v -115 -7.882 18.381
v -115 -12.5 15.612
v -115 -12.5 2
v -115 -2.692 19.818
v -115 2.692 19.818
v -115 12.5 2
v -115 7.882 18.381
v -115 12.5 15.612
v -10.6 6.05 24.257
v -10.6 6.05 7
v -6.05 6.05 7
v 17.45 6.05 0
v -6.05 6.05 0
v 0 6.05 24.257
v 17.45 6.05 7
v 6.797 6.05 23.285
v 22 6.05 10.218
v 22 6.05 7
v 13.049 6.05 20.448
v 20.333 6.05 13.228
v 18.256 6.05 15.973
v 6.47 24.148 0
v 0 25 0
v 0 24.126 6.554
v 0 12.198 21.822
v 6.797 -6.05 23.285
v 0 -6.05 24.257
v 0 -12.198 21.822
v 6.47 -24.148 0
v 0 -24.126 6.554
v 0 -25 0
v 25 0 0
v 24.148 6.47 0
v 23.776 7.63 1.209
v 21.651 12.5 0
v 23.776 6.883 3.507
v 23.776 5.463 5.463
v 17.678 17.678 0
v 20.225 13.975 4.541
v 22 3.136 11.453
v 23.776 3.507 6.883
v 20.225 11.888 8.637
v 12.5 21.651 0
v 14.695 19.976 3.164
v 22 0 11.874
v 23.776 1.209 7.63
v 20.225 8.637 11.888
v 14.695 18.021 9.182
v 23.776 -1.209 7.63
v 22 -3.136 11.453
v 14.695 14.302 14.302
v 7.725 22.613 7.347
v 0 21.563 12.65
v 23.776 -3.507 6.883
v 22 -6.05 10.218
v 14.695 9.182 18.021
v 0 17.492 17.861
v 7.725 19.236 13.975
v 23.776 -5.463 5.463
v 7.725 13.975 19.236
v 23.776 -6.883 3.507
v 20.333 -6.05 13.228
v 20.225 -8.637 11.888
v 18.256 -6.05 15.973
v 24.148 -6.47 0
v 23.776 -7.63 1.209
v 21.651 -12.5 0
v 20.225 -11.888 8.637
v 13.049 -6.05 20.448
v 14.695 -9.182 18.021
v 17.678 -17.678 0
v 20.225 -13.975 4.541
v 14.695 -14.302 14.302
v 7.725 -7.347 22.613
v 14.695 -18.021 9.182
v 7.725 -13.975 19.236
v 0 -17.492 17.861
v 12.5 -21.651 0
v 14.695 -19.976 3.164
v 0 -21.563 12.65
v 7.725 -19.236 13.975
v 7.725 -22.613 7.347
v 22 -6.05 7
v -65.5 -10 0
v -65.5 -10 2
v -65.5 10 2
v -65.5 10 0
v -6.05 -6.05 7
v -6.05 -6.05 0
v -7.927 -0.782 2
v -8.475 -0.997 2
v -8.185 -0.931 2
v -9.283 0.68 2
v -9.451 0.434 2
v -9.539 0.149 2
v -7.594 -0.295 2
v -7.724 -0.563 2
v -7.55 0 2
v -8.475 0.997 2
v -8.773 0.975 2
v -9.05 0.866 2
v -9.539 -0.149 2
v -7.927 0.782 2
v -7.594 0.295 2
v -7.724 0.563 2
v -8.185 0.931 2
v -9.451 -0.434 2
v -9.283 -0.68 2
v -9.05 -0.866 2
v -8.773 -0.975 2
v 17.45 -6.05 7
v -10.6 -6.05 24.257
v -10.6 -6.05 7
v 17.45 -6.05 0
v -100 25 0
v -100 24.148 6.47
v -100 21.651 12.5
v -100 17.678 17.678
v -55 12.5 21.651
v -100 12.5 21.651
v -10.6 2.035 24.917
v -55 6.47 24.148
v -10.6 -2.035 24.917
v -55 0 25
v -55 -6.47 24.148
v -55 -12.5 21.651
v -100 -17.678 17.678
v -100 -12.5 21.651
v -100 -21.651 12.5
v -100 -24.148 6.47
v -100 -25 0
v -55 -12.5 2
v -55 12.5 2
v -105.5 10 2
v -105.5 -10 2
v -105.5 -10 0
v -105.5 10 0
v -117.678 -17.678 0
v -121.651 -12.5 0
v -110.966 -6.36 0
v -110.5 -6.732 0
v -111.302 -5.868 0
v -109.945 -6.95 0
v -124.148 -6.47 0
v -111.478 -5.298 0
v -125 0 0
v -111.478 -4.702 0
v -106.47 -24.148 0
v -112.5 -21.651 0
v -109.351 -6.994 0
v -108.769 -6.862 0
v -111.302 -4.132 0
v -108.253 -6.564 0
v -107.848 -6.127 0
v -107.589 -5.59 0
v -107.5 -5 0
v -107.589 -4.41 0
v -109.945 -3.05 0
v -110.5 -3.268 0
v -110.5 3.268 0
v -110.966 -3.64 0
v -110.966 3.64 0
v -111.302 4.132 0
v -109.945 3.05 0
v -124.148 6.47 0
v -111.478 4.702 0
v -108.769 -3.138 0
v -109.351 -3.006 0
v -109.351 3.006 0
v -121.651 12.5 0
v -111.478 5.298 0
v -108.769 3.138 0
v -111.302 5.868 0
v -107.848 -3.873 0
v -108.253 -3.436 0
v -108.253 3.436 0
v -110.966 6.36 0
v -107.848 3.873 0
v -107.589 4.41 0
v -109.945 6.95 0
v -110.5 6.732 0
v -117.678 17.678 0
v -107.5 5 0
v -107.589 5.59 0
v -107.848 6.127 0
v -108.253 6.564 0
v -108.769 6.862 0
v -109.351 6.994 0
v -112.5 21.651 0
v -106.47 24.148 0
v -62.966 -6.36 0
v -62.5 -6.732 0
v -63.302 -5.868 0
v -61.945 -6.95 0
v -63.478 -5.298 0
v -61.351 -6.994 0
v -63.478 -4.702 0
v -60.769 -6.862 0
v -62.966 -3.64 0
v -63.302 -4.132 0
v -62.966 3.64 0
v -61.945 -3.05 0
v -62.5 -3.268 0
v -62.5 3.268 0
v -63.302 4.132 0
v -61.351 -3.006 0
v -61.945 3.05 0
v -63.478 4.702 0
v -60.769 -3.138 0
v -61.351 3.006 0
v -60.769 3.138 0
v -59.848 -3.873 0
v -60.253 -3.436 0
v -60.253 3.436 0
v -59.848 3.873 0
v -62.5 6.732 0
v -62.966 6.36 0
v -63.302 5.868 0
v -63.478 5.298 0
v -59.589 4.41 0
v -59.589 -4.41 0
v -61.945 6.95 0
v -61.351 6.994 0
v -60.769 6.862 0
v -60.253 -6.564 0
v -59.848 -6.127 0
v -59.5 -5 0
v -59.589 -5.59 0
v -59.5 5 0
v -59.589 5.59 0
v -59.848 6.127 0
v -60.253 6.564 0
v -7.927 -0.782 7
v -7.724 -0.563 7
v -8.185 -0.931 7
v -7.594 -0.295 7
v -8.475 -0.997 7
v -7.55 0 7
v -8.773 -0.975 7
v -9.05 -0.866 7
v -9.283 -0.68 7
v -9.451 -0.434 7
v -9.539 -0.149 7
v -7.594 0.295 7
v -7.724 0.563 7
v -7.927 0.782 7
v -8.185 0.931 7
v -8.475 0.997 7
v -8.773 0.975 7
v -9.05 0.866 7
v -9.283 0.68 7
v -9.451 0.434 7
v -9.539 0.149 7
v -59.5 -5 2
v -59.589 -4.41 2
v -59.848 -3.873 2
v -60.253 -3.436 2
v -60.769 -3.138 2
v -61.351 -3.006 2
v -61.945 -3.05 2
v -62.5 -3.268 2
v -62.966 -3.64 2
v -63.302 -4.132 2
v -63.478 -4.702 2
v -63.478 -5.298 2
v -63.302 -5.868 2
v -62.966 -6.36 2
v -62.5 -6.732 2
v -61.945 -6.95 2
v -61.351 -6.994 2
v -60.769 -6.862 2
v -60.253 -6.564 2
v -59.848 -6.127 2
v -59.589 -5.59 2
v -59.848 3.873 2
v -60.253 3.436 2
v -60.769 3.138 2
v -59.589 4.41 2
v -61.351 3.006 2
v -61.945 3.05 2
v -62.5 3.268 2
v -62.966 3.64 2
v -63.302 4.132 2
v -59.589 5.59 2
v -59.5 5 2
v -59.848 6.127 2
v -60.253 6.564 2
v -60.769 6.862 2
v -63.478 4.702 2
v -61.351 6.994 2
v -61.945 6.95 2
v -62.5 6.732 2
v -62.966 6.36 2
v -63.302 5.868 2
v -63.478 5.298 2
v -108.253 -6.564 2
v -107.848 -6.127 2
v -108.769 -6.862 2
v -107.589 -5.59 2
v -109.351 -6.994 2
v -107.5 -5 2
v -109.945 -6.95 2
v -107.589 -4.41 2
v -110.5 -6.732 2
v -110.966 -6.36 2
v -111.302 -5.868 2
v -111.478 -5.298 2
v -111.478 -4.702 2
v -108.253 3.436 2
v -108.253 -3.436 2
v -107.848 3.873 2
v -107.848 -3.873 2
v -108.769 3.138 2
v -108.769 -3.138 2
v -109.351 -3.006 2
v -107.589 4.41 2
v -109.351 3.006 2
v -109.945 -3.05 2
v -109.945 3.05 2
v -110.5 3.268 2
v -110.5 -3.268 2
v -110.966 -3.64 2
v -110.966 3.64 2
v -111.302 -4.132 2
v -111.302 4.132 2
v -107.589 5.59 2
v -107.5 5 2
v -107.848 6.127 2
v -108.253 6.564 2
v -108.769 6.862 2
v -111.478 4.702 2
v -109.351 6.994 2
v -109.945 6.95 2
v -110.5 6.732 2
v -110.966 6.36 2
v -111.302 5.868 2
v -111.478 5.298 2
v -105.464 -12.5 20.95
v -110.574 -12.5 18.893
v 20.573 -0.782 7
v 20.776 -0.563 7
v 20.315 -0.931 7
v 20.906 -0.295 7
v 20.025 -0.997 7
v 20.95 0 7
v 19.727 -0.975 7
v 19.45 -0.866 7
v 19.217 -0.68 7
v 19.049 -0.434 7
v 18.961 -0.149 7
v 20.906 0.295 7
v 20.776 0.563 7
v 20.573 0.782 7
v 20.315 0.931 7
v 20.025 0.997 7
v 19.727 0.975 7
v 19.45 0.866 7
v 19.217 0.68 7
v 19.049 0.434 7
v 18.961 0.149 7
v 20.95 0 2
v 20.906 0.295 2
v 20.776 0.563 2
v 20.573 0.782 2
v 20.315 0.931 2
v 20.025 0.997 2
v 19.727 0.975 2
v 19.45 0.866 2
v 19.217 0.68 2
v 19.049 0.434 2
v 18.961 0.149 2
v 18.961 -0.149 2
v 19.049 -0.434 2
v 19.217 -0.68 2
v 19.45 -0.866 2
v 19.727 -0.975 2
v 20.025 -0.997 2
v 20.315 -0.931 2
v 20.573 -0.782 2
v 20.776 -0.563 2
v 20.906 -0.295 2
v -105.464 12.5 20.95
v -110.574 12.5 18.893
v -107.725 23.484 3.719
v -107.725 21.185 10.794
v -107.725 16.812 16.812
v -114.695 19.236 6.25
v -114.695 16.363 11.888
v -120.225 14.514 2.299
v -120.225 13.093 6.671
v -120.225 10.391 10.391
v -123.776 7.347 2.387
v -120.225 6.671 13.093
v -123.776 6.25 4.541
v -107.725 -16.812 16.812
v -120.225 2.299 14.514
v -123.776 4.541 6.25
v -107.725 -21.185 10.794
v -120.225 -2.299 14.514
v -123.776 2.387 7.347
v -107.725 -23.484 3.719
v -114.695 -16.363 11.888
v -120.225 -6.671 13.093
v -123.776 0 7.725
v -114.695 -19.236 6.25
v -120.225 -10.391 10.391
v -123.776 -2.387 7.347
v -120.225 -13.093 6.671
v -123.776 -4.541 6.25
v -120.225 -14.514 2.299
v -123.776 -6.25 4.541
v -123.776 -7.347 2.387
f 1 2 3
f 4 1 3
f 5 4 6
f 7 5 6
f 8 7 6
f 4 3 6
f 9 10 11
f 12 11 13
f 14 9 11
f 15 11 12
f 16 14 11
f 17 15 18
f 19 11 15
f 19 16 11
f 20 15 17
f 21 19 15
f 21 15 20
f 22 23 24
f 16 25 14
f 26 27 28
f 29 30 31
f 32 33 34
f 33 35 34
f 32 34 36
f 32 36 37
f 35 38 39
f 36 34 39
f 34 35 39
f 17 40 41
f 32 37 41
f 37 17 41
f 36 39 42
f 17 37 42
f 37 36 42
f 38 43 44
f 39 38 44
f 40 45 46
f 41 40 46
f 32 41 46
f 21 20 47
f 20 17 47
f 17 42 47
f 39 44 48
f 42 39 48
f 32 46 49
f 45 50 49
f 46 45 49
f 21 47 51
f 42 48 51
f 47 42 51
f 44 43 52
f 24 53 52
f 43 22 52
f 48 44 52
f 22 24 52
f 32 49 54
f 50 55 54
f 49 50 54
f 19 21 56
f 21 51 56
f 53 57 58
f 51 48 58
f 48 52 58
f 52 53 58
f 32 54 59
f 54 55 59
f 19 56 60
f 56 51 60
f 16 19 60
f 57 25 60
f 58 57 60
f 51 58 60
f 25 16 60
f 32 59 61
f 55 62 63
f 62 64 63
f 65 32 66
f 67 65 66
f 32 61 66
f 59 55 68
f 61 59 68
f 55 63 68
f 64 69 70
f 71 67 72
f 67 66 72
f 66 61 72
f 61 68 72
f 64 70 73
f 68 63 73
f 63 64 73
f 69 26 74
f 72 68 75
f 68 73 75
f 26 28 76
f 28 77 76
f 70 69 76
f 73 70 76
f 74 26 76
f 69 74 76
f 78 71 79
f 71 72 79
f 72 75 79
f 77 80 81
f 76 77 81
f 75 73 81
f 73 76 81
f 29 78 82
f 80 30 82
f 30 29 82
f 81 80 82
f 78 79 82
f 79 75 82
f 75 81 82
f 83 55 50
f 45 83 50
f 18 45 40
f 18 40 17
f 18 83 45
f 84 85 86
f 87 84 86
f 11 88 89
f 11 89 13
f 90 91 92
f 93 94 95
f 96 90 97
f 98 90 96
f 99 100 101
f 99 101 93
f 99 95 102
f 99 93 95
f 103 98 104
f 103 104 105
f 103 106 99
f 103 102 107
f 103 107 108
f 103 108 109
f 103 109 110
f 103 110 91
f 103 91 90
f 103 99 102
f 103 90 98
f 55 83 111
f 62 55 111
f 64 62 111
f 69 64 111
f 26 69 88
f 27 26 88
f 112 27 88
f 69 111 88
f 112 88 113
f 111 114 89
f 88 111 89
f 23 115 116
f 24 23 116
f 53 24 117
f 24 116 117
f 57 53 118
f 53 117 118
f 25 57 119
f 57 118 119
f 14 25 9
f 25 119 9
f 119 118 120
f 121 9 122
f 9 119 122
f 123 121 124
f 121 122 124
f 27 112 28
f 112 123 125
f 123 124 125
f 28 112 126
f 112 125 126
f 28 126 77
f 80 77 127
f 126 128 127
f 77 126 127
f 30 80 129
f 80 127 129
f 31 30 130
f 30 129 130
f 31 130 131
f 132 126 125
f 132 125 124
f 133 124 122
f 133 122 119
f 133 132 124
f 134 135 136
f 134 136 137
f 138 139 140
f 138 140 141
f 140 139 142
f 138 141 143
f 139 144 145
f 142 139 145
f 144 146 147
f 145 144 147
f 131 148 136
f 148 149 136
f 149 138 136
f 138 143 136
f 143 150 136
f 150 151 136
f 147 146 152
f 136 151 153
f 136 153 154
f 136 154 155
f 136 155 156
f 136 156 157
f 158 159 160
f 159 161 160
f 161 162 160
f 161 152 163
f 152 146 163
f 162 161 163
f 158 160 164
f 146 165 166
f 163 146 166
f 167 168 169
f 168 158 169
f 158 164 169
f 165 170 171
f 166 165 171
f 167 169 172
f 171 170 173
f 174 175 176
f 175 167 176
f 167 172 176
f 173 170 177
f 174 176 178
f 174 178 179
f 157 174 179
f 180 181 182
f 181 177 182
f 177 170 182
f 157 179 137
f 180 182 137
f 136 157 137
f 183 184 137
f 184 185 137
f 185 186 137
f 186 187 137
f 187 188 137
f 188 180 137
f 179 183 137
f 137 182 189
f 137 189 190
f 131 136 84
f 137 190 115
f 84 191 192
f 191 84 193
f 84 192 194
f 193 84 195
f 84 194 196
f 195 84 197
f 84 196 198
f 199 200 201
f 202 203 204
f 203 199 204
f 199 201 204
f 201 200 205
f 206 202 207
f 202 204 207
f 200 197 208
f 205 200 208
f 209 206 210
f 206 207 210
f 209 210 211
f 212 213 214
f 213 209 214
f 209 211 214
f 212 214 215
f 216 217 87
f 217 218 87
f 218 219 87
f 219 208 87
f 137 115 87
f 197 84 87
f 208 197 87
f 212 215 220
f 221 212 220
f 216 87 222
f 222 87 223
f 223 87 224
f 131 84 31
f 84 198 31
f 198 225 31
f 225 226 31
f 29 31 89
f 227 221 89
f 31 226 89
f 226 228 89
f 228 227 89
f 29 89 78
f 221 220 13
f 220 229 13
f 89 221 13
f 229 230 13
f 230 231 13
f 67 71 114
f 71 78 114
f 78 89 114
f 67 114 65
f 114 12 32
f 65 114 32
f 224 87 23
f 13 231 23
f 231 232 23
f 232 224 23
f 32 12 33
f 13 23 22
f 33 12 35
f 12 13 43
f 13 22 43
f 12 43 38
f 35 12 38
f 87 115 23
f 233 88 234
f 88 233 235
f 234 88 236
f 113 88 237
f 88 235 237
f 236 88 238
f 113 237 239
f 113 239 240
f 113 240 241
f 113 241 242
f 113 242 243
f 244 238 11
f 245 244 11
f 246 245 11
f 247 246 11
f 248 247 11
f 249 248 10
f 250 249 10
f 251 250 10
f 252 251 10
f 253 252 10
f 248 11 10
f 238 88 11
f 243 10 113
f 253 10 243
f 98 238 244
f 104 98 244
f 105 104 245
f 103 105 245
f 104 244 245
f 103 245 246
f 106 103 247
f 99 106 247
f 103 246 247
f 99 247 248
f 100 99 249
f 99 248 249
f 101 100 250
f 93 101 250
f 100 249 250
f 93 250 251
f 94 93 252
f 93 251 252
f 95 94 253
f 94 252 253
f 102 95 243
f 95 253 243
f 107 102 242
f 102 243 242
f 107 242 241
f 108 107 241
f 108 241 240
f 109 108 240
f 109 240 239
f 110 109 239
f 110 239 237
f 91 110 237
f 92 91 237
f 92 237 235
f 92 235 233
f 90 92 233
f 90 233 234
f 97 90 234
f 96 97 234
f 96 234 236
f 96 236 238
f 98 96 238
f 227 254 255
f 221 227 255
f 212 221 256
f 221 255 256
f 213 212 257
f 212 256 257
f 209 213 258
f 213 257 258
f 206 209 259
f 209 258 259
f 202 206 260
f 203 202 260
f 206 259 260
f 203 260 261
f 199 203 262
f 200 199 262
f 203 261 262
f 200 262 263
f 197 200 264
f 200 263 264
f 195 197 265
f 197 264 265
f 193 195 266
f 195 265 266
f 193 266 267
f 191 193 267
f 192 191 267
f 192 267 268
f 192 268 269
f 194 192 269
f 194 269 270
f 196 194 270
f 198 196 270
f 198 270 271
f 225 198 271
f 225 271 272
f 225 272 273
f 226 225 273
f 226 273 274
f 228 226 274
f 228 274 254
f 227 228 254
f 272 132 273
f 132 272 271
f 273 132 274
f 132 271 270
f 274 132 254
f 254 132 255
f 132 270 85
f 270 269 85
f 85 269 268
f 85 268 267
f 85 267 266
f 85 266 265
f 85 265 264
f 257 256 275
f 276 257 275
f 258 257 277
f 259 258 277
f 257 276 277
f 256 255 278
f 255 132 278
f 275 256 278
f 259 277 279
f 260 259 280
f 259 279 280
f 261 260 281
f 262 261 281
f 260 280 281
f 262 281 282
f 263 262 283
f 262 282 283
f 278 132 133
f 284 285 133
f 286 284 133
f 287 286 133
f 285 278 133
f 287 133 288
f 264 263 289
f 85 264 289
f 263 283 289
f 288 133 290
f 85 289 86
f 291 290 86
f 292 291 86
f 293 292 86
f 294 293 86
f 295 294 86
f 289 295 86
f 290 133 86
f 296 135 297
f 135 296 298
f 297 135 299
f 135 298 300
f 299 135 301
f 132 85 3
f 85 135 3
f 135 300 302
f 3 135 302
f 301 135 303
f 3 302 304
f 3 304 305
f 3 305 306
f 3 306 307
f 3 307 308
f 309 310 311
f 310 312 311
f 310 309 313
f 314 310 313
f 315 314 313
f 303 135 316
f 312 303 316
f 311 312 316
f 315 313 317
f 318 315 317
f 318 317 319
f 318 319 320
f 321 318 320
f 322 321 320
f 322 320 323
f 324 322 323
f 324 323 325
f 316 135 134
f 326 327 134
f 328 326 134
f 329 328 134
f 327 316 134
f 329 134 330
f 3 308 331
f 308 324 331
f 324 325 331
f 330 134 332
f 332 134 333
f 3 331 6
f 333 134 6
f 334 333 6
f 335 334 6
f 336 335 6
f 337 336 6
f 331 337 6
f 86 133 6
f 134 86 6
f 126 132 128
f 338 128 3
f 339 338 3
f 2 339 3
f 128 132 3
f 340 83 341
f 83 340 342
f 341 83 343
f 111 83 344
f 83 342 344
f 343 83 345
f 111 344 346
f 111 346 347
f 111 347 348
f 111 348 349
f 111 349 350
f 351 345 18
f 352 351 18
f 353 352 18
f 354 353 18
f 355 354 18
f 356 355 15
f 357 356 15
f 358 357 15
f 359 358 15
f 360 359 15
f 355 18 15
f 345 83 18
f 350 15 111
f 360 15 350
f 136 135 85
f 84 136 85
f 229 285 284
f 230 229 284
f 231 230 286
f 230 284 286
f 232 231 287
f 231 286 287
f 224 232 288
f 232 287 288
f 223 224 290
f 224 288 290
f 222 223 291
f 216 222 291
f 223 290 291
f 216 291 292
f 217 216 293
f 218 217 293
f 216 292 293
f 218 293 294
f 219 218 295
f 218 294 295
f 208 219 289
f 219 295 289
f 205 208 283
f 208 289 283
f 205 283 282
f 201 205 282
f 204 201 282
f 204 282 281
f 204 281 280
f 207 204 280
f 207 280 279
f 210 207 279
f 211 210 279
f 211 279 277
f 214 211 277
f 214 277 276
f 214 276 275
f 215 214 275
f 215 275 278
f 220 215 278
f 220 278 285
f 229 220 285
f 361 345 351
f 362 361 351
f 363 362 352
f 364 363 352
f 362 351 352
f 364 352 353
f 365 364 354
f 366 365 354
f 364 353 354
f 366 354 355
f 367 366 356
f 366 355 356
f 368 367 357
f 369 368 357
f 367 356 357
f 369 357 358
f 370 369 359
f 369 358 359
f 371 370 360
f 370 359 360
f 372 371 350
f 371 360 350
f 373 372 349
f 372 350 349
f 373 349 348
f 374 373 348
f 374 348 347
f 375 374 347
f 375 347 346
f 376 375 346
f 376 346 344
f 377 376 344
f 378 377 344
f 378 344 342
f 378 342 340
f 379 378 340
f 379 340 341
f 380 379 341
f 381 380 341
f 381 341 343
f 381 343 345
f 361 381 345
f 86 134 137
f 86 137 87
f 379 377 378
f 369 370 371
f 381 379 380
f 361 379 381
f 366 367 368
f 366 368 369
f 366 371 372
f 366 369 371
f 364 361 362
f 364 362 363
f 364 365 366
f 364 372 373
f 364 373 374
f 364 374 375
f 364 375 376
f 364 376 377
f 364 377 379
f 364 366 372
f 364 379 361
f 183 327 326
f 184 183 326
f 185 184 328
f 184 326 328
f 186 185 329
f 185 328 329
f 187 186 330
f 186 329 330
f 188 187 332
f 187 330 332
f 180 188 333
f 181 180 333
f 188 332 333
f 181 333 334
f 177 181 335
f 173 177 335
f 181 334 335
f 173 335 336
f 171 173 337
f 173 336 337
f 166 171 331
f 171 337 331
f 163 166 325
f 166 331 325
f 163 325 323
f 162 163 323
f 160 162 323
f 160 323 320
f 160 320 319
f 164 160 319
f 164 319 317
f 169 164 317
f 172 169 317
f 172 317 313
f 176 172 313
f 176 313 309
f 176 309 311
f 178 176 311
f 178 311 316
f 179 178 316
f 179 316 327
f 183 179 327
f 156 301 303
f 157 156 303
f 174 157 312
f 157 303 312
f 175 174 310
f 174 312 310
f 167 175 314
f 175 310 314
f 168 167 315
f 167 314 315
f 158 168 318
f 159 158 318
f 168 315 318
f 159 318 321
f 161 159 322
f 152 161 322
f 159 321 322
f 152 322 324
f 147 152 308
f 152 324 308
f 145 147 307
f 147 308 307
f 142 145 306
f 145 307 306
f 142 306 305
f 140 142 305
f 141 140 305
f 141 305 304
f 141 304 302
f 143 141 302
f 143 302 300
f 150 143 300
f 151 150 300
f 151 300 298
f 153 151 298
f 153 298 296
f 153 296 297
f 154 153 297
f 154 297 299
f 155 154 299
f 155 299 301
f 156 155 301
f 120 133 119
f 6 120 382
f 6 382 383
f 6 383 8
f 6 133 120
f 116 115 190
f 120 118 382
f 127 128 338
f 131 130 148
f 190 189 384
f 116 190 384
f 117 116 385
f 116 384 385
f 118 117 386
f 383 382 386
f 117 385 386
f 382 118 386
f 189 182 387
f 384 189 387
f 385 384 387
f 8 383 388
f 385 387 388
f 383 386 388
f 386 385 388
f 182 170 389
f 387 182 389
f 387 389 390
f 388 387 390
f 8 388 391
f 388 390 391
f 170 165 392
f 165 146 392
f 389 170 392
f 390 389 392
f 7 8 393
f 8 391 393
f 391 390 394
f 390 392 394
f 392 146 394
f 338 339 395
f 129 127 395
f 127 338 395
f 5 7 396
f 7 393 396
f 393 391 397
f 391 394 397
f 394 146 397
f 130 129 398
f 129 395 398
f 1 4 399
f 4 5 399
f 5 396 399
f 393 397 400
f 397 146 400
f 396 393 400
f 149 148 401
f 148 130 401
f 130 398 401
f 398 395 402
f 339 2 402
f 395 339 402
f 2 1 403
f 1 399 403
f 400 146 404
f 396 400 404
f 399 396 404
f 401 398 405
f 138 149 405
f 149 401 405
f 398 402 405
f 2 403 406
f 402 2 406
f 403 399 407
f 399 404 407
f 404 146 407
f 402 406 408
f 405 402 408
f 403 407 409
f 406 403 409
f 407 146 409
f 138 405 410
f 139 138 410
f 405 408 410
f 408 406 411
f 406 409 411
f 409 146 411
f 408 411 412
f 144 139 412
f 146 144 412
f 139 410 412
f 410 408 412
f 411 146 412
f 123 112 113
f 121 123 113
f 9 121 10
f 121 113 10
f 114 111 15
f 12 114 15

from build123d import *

# Parameters (mm, degrees)
REVOLVE1_ANGLE                  = 180
CUT_EXTRUDE3_START              = -2
SKETCH3_W                       = 60
SKETCH3_H                       = 25
CUT_EXTRUDE3_DEPTH              = 24
SKETCH7_R                       = 2
SKETCH7_W                       = 40
SKETCH7_H                       = 20
SKETCH7_R_2                     = 3
CUT_EXTRUDE8_DEPTH              = 10
CUT_EXTRUDE13_START             = 25
SKETCH16_R                      = 1
SKETCH16_W                      = 23.5
SKETCH16_H                      = 12.1
CUT_EXTRUDE13_DEPTH             = 23
CUT_EXTRUDE14_START             = -7
SKETCH18_W                      = 4.55
SKETCH18_H                      = 12.1
CUT_EXTRUDE14_DEPTH             = 19.0000001
SKETCH19_R                      = 2.5
CUT_EXTRUDE15_DEPTH             = 3
SKIZZE1_R                       = 4.489769008
SCHNITT_LINEAR_AUSTRAGEN1_DEPTH = 10
SKIZZE2_W                       = 23.5
SKIZZE2_H                       = 12.1
SCHNITT_LINEAR_AUSTRAGEN2_DEPTH = 10


with BuildPart() as part:
    # Sketch1 → Revolve1 (revolve)
    with BuildSketch(Plane.XY):
        with BuildLine():
            Line((-125, 0), (25, 0))
            ThreePointArc((25, 0), (17.67766953, 17.67766953), (0, 25))
            Line((0, 25), (-100, 25))
            ThreePointArc((-100, 25), (-117.67766953, 17.67766953), (-125, 0))
        make_face()
    revolve(axis=Axis((-125, 0, 0), (1, 0, 0)), revolution_arc=REVOLVE1_ANGLE)

    # Sketch3 → Cut-Extrude3 (cut, through all)
    with BuildSketch(Plane(origin=(0, 0, 0), x_dir=(-1, 0, 0), z_dir=(0, 0, -1)).offset(CUT_EXTRUDE3_START)):
        with Locations((85, 0)):
            Rectangle(SKETCH3_W, SKETCH3_H)
    extrude(amount=-CUT_EXTRUDE3_DEPTH, mode=Mode.SUBTRACT)

    # Sketch7 → Cut-Extrude8 (cut)
    with BuildSketch(Plane.XY.offset(2)):
        with Locations((-109.5, 5)):
            Circle(SKETCH7_R)
        with Locations((-61.5, 5)):
            Circle(SKETCH7_R)
        with Locations((-109.5, -5)):
            Circle(SKETCH7_R)
        with Locations((-61.5, -5)):
            Circle(SKETCH7_R)
        with Locations((-85.5, 0)):
            Rectangle(SKETCH7_W, SKETCH7_H)
        with Locations((-95.5, -0.25)):
            Circle(SKETCH7_R_2, mode=Mode.SUBTRACT)
    extrude(amount=-CUT_EXTRUDE8_DEPTH, mode=Mode.SUBTRACT)

    # Sketch16 → Cut-Extrude13 (cut)
    with BuildSketch(Plane.XY.offset(CUT_EXTRUDE13_START)):
        with Locations((-8.55, 0)):
            Circle(SKETCH16_R)
        with Locations((19.95, 0)):
            Circle(SKETCH16_R)
        with Locations((5.7, 0)):
            Rectangle(SKETCH16_W, SKETCH16_H)
    extrude(amount=-CUT_EXTRUDE13_DEPTH, mode=Mode.SUBTRACT)

    # Sketch18 → Cut-Extrude14 (cut, through all)
    with BuildSketch(Plane(origin=(0, 0, 0), x_dir=(-1, 0, 0), z_dir=(0, 0, -1)).offset(CUT_EXTRUDE14_START)):
        with Locations((-19.725, 0)):
            Rectangle(SKETCH18_W, SKETCH18_H)
        with Locations((8.325, 0)):
            Rectangle(SKETCH18_W, SKETCH18_H)
    extrude(amount=-CUT_EXTRUDE14_DEPTH, mode=Mode.SUBTRACT)

    # Sketch19 → Cut-Extrude15 (cut, through all)
    with BuildSketch(Plane.XY.offset(2)):
        with Locations((11, 0)):
            Circle(SKETCH19_R)
    extrude(amount=-CUT_EXTRUDE15_DEPTH, mode=Mode.SUBTRACT)

    # Skizze1 → Schnitt-Linear austragen1 (cut)
    with BuildSketch(Plane.XY.offset(2)):
        with Locations((-95.5, -0.25)):
            Circle(SKIZZE1_R)
    extrude(amount=-SCHNITT_LINEAR_AUSTRAGEN1_DEPTH, mode=Mode.SUBTRACT)

    # Skizze2 → Schnitt-Linear austragen2 (cut)
    with BuildSketch(Plane.XY.offset(2)):
        with Locations((5.7, 0)):
            Rectangle(SKIZZE2_W, SKIZZE2_H)
    extrude(amount=-SCHNITT_LINEAR_AUSTRAGEN2_DEPTH, mode=Mode.SUBTRACT)


solid = part.part
